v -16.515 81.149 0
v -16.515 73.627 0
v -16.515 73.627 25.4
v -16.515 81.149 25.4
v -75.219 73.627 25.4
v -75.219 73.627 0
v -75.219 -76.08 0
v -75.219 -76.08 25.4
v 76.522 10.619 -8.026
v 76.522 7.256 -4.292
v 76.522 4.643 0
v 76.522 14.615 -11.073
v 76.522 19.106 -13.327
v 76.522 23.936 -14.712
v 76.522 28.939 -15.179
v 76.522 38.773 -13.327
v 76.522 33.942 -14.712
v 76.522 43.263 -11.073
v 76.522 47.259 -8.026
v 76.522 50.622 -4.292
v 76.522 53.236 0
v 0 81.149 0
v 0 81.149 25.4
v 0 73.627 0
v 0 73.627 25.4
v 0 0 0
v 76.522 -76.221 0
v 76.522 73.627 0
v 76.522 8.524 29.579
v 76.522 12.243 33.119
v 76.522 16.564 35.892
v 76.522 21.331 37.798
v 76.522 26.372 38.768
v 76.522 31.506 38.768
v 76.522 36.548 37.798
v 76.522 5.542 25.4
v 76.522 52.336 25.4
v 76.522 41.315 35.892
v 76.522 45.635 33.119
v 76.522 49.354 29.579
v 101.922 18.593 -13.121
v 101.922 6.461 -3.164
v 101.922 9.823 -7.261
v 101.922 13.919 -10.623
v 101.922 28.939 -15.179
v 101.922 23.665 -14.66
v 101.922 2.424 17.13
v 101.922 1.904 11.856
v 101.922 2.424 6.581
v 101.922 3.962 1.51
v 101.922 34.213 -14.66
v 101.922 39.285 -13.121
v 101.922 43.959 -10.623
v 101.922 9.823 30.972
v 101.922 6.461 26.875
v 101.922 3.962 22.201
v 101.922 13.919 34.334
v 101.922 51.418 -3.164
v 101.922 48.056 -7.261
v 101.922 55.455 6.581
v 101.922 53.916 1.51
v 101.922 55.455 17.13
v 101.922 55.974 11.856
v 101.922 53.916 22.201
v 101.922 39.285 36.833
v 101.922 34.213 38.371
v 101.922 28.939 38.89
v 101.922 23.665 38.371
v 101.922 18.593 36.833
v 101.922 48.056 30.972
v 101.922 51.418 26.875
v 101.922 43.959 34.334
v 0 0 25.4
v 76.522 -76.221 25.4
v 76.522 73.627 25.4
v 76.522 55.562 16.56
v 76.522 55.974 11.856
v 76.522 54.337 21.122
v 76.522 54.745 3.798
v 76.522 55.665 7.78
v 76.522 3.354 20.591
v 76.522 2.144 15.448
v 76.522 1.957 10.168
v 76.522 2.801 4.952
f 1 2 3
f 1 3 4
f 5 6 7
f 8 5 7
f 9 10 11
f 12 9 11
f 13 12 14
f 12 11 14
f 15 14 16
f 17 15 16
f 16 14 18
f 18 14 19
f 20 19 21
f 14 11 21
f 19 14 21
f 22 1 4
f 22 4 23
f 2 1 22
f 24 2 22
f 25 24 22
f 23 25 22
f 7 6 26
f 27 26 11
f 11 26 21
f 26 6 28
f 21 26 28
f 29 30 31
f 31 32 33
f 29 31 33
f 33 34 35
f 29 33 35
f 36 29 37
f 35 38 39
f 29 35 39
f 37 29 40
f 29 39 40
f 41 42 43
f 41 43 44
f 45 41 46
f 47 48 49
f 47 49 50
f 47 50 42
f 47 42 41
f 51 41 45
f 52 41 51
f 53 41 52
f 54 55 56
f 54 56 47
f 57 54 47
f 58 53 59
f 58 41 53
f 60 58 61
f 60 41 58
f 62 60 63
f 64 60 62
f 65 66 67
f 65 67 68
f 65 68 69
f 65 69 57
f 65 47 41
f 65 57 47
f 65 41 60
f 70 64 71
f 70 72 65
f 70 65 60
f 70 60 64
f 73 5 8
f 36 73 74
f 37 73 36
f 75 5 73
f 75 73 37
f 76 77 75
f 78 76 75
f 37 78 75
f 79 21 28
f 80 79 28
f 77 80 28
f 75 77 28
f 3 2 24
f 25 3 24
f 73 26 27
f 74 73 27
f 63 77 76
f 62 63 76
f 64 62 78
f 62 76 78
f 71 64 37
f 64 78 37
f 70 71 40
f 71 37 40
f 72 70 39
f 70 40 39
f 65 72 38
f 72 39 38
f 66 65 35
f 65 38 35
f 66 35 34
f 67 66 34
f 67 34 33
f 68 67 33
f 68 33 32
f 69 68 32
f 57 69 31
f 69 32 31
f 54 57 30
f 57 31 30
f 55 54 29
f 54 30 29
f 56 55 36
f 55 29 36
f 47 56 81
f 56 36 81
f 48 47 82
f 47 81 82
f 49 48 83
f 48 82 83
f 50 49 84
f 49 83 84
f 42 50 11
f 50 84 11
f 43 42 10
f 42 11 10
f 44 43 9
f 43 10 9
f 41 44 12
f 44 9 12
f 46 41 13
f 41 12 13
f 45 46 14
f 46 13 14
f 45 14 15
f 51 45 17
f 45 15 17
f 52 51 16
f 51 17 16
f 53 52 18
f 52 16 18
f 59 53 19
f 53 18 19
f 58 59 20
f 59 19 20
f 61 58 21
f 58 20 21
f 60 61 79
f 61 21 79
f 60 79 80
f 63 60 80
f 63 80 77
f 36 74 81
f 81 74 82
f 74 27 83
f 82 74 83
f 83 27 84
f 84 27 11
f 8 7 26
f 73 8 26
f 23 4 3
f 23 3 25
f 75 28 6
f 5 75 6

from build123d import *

# Parameters (mm, degrees)
F3_DEPTH = 25.4
F2_W     = 16.5145844221
F2_H     = 7.5223818421
F4_R     = 27.0348190112
F5_DEPTH = 25.4


with BuildPart() as f3:
    # F0 (on Top) → F3 (new body)
    with BuildSketch(Plane.XY):
        Polygon((-75.2194747329, -76.0797411203), (0, 0), (76.5220746398, -76.2212574482), (76.5220746398, 73.6268535256), (-75.2194747329, 73.6268535256), align=None)
    extrude(amount=F3_DEPTH)

    # F4 (on face) → F5 (join)
    with BuildSketch(Plane.YZ.offset(76.5220746398)):
        with Locations((28.9392322302, 11.8555948138)):
            Circle(F4_R)
    extrude(amount=F5_DEPTH)


with BuildPart() as f3b:
    # F2 (on face) → F3, piece 2 (new body)
    with BuildSketch(Plane.XY):
        with Locations((-8.2572922111, 77.3880444467)):
            Rectangle(F2_W, F2_H)
    extrude(amount=F3_DEPTH)


solid = Compound([f3.part, f3b.part])
